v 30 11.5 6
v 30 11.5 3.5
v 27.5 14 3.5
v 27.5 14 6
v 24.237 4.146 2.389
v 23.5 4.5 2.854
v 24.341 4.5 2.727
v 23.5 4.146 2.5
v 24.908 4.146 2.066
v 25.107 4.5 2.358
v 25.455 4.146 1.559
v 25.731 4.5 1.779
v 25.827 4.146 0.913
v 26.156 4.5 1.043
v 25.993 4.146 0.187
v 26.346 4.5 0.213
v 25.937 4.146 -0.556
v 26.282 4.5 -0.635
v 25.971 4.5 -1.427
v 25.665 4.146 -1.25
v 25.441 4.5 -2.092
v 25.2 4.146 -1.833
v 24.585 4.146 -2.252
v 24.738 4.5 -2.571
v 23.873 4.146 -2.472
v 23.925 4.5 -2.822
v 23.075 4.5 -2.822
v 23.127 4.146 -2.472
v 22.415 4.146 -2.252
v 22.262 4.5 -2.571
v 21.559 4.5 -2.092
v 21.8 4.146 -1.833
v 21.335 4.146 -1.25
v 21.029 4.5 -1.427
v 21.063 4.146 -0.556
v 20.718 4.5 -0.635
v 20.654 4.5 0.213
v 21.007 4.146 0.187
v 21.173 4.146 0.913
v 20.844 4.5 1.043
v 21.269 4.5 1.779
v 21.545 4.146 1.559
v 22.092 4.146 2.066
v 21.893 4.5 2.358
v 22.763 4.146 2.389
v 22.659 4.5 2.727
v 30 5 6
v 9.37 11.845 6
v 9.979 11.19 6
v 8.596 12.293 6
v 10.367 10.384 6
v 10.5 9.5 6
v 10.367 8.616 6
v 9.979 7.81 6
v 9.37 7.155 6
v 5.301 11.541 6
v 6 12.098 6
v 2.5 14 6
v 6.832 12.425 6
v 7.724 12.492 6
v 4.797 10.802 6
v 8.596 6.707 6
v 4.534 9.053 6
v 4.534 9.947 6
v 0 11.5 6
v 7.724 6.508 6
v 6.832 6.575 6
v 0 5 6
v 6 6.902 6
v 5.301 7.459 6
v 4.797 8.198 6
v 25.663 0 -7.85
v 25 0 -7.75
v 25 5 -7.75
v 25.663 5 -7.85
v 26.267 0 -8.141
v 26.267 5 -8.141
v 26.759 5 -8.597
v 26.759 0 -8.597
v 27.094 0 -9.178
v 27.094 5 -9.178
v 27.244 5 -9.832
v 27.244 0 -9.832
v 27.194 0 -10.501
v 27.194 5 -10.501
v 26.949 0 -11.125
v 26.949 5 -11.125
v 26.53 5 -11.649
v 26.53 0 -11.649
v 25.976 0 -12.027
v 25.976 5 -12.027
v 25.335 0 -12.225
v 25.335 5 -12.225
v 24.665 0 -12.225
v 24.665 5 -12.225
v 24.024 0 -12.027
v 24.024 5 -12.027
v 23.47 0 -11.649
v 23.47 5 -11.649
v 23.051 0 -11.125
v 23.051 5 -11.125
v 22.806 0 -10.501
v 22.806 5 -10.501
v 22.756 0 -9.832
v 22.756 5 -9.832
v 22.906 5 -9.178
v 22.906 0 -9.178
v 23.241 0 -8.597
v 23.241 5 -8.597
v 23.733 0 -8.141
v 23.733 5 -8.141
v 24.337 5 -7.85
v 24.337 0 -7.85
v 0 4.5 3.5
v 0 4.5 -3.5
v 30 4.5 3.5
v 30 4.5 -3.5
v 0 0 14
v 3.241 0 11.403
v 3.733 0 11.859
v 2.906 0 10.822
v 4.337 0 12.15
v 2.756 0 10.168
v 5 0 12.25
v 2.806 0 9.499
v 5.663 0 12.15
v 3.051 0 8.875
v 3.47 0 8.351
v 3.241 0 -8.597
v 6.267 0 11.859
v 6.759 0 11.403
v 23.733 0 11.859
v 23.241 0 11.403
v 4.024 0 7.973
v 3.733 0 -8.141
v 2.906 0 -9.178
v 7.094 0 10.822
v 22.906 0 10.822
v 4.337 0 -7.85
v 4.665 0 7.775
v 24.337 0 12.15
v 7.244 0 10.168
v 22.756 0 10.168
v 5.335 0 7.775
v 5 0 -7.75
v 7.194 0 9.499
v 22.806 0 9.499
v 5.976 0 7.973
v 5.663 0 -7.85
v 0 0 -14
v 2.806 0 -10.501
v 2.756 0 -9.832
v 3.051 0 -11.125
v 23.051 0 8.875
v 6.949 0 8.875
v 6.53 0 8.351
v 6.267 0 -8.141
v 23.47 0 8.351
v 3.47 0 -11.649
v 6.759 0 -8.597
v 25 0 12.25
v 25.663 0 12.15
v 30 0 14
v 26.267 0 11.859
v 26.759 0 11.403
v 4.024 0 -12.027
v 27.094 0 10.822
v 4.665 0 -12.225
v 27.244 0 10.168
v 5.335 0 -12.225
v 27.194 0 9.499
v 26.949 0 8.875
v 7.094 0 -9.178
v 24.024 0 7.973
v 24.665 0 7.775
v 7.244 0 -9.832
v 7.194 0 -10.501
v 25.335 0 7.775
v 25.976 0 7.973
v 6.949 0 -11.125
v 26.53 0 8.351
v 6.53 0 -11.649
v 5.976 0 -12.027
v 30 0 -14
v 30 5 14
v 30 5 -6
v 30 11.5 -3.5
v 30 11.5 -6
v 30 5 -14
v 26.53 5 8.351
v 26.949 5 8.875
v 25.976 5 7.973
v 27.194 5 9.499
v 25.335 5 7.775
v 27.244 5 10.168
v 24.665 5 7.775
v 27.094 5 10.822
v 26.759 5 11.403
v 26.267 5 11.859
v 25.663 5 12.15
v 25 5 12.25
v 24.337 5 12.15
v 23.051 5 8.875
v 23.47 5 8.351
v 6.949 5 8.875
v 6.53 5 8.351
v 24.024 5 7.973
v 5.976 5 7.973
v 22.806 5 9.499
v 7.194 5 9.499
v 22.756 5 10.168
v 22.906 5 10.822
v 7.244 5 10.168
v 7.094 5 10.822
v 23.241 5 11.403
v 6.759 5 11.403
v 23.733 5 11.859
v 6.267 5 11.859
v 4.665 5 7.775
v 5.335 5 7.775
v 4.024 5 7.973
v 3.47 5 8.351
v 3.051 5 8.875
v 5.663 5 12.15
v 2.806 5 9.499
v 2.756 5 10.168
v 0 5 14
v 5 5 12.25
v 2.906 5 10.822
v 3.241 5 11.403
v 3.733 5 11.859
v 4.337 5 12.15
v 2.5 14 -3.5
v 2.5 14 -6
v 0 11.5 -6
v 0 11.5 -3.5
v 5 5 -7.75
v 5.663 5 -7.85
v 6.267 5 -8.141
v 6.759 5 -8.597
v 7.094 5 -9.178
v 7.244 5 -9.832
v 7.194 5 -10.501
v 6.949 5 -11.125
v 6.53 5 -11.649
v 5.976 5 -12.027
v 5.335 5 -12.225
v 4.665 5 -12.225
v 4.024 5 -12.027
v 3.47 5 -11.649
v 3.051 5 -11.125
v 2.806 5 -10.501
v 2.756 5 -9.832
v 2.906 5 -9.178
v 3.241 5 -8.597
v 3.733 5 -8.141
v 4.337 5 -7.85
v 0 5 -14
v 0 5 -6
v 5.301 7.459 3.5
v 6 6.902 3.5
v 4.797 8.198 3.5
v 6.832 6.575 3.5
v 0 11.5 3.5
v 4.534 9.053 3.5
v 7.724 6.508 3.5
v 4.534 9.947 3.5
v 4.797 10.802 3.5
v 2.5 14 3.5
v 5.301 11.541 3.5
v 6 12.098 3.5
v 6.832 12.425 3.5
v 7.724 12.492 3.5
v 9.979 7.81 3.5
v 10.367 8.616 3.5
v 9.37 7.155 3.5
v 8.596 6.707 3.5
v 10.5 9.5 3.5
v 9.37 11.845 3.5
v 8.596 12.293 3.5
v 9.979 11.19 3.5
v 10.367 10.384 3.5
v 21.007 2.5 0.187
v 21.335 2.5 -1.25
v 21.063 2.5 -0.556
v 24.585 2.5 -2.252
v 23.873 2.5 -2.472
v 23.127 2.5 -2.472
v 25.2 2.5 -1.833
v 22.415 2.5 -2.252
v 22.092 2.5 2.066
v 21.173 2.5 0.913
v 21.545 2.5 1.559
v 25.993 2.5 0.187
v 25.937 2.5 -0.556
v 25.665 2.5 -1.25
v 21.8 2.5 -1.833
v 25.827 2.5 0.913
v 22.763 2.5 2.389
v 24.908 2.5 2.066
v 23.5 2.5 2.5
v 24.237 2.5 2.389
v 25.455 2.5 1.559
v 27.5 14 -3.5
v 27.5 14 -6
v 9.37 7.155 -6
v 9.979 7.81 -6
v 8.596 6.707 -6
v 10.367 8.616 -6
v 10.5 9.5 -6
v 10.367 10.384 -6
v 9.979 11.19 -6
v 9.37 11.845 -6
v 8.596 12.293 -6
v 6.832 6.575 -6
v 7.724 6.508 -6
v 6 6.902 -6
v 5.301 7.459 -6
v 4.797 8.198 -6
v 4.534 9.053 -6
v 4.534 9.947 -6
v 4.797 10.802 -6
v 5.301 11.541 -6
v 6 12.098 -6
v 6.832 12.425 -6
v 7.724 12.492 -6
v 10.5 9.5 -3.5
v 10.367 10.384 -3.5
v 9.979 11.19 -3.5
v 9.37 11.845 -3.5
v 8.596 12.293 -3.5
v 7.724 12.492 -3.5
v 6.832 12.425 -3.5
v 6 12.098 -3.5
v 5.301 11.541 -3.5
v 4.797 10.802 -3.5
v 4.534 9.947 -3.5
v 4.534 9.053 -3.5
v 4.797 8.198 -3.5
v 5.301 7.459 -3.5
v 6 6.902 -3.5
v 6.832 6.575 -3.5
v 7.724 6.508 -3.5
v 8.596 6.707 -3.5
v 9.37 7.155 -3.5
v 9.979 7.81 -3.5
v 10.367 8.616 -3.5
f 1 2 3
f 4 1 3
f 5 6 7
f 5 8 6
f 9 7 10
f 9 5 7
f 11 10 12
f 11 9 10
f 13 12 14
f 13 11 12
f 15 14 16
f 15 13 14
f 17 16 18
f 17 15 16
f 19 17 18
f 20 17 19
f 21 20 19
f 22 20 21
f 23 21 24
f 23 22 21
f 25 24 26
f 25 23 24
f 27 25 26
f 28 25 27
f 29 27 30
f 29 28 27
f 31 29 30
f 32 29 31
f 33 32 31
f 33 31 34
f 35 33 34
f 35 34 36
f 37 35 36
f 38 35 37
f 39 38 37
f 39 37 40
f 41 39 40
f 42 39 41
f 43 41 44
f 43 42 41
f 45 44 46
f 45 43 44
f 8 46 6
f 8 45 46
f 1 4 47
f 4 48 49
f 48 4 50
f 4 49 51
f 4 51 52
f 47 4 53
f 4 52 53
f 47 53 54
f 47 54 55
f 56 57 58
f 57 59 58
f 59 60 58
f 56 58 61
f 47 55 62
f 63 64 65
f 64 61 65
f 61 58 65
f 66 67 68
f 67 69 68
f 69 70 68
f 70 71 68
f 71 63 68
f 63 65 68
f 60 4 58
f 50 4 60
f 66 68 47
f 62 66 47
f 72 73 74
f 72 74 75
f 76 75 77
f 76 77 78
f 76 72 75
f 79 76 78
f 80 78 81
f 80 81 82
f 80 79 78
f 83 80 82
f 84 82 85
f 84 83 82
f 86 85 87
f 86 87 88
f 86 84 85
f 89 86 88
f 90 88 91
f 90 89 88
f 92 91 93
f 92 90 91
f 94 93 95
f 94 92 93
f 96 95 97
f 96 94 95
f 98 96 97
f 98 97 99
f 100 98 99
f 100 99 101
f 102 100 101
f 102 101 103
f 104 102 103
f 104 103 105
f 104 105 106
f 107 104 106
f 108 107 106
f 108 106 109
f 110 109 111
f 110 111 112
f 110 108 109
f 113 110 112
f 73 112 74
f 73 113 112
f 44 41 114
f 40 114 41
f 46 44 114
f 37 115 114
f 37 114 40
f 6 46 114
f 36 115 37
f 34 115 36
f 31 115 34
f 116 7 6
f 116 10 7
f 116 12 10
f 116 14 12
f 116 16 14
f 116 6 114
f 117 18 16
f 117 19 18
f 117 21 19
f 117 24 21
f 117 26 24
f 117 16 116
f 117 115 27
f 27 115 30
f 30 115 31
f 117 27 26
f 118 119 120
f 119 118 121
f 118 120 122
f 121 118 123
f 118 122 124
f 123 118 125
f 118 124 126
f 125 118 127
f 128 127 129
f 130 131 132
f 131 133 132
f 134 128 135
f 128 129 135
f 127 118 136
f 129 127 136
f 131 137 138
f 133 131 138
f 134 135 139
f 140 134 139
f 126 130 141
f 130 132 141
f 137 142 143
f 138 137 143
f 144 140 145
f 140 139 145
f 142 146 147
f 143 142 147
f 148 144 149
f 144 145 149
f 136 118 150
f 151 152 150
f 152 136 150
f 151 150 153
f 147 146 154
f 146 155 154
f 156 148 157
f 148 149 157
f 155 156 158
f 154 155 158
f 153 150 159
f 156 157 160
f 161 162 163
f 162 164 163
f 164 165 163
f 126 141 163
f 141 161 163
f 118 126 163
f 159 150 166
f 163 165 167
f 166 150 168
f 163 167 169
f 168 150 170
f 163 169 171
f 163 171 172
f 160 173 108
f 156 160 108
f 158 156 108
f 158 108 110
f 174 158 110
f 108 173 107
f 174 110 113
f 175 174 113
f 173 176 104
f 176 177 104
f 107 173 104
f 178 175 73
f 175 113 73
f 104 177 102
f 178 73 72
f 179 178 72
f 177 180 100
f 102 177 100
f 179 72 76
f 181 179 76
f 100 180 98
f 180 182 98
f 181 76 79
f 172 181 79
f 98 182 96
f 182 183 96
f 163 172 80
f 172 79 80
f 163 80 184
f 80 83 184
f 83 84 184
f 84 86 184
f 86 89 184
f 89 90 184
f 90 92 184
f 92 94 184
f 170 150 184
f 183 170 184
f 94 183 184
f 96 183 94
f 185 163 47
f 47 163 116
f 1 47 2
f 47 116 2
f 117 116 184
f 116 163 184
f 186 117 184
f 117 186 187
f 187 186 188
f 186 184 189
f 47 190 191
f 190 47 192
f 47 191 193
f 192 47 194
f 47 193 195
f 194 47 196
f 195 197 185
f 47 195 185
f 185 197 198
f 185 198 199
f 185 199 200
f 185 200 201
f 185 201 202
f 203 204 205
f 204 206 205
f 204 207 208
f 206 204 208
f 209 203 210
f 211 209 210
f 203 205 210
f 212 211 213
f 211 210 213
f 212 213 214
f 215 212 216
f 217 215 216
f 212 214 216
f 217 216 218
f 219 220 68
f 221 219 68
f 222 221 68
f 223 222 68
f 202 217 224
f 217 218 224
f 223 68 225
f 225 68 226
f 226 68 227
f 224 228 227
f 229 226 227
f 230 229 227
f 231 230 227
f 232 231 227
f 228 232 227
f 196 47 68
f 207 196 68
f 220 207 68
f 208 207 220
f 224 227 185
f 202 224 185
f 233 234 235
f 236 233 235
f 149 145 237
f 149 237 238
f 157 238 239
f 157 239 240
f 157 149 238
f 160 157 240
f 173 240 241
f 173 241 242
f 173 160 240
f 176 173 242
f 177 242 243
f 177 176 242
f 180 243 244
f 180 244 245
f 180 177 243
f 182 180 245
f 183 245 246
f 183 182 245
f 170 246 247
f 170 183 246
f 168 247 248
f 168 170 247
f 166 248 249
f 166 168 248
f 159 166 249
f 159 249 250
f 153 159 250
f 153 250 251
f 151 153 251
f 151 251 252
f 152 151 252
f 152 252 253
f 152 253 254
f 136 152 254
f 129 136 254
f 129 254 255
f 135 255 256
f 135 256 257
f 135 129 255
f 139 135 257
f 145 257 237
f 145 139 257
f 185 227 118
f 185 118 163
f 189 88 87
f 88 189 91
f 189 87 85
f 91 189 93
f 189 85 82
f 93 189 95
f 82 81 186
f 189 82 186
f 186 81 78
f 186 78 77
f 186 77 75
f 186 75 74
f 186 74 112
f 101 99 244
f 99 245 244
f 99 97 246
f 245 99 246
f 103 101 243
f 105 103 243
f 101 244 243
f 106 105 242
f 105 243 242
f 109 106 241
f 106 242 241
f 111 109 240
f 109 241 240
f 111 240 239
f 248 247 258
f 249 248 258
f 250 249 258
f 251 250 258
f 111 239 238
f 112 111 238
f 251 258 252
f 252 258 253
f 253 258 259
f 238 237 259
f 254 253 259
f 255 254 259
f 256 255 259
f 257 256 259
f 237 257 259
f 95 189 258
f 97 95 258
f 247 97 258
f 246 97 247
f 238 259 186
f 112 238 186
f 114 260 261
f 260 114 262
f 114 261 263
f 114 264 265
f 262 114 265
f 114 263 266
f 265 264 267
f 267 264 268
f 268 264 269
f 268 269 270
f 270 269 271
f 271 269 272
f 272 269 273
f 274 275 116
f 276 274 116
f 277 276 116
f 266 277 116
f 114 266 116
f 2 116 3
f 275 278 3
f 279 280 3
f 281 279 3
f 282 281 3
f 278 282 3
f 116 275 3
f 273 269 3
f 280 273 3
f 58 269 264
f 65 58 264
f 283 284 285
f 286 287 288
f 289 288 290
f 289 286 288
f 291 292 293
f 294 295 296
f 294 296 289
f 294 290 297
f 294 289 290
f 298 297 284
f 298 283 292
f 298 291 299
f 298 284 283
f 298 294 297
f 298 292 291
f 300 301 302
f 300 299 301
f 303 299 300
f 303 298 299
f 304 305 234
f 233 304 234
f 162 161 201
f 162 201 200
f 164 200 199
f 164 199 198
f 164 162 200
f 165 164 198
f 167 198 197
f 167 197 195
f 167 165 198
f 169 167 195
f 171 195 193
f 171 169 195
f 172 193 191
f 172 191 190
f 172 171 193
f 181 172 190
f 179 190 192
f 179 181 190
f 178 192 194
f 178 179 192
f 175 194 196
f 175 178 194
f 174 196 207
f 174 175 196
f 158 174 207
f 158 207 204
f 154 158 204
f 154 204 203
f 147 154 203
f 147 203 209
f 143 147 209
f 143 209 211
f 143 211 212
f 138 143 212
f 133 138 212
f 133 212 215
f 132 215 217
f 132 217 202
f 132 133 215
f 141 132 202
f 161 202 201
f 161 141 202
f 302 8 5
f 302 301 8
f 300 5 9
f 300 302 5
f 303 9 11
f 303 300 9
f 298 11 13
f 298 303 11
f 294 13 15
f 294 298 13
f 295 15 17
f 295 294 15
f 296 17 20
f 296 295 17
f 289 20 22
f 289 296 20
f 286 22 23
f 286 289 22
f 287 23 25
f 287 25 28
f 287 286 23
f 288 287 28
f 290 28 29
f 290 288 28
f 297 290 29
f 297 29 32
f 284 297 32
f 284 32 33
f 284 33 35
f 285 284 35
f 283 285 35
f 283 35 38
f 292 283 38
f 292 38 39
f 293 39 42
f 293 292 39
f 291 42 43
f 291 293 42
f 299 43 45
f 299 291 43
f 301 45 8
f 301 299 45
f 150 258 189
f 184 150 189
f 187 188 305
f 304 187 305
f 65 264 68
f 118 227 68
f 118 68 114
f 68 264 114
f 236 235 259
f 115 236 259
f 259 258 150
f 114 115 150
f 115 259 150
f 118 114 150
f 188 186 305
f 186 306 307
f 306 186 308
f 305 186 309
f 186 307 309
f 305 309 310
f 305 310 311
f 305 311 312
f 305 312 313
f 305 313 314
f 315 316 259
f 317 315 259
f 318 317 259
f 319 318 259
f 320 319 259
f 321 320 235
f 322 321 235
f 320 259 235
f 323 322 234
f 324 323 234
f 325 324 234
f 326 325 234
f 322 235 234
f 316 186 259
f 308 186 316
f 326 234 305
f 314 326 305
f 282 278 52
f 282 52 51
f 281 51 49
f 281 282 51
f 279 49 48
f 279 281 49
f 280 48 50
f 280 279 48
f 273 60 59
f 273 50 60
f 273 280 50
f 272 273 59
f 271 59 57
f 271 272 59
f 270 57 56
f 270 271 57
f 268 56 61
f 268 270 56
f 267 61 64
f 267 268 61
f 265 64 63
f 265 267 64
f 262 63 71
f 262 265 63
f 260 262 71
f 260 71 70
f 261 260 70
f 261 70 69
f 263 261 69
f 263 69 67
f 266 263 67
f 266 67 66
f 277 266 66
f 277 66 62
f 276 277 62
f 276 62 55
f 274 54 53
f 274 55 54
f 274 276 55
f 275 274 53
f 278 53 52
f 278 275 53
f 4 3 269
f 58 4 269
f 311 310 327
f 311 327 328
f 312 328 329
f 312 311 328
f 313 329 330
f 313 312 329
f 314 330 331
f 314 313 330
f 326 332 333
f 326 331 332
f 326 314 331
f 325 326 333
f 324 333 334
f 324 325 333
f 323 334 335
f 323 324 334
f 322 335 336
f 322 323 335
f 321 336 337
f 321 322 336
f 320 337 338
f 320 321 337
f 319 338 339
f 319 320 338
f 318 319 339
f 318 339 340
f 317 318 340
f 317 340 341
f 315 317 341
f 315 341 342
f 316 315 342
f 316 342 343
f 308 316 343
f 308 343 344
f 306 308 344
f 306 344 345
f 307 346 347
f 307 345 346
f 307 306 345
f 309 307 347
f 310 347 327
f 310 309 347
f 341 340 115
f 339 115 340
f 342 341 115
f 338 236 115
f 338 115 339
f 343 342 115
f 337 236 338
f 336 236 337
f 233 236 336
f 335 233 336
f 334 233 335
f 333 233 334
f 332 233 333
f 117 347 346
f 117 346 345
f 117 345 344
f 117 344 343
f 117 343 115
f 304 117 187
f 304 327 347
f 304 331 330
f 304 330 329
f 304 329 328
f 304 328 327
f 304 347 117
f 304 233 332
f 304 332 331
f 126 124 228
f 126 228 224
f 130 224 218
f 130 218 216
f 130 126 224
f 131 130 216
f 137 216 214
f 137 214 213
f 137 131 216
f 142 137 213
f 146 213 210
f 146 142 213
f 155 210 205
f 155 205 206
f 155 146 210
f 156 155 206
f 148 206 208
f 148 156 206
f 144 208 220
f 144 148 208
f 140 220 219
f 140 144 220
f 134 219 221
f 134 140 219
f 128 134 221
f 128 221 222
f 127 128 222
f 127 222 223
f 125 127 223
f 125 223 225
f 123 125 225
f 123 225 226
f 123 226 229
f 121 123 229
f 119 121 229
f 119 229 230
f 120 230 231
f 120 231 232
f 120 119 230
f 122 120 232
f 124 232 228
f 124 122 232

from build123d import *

# Parameters (mm, degrees)
BOSS_EXTRUDE1_DEPTH      = 14
BOSS_EXTRUDE1_DEPTH_BACK = 14
CUT_EXTRUDE1_DEPTH       = 14
CUT_EXTRUDE1_DEPTH_BACK  = 14
SKETCH2_R                = 3
CUT_EXTRUDE2_DEPTH       = 3.5
CUT_EXTRUDE2_DEPTH_BACK  = 3.5
SKETCH3_W                = 30
SKETCH3_H                = 9.5
SKETCH5_W                = 56
SKETCH5_H                = 28
CUT_EXTRUDE3_DEPTH       = 30
SKETCH6_R                = 2.25
CUT_EXTRUDE4_DEPTH       = 5
SKETCH7_R                = 2.25
CUT_EXTRUDE5_DEPTH       = 5
SKETCH8_R                = 2.25
CUT_EXTRUDE6_DEPTH       = 5
SKETCH9_R                = 2.25
CUT_EXTRUDE7_DEPTH       = 5


with BuildPart() as part:
    # Sketch1 → Boss-Extrude1 (new, two sides: drawn at the far end of the back side and taken through both)
    with BuildSketch(Plane.XY.offset(-BOSS_EXTRUDE1_DEPTH_BACK)):
        Polygon((0, 11.5), (0, 0), (30, 0), (30, 11.5), (27.5, 14), (2.5, 14), align=None)
    extrude(amount=BOSS_EXTRUDE1_DEPTH + BOSS_EXTRUDE1_DEPTH_BACK)

    # Sketch2 → Cut-Extrude1 (cut, two sides: drawn at the far end of the back side and taken through both)
    with BuildSketch(Plane.XY.offset(-CUT_EXTRUDE1_DEPTH_BACK)):
        with Locations((7.5, 9.5)):
            Circle(SKETCH2_R)
    extrude(amount=CUT_EXTRUDE1_DEPTH + CUT_EXTRUDE1_DEPTH_BACK, mode=Mode.SUBTRACT)

    # Sketch3 → Cut-Extrude2 (cut, two sides: drawn at the far end of the back side and taken through both)
    with BuildSketch(Plane.XY.offset(-CUT_EXTRUDE2_DEPTH_BACK)):
        with Locations((15, 9.25)):
            Rectangle(SKETCH3_W, SKETCH3_H)
    extrude(amount=CUT_EXTRUDE2_DEPTH + CUT_EXTRUDE2_DEPTH_BACK, mode=Mode.SUBTRACT)

    # Sketch4 → Cut-Revolve1 (revolve, cut)
    with BuildSketch(Plane.XY):
        Polygon((23.5, 4.5), (26.353553391, 4.5), (26, 4.146446609), (26, 2.5), (23.5, 2.5), align=None)
    revolve(axis=Axis((23.5, 2.5, 0), (0, 1, 0)), mode=Mode.SUBTRACT)

    # Sketch5 → Cut-Extrude3 (cut)
    with BuildSketch(Plane(origin=(0, 0, 0), x_dir=(0, 0, -1), z_dir=(1, 0, 0))):
        with Locations((0, 12)):
            Rectangle(SKETCH5_W, SKETCH5_H)
        Polygon((-14, 5), (-14, 0), (14, 0), (14, 5), (6, 5), (6, 14), (-6, 14), (-6, 5), align=None, mode=Mode.SUBTRACT)
    extrude(amount=CUT_EXTRUDE3_DEPTH, mode=Mode.SUBTRACT)

    # Sketch6 → Cut-Extrude4 (cut)
    with BuildSketch(Plane(origin=(0, 0, 0), x_dir=(1, 0, 0), z_dir=(0, 1, 0))):
        with Locations((5, -10)):
            Circle(SKETCH6_R)
    extrude(amount=CUT_EXTRUDE4_DEPTH, mode=Mode.SUBTRACT)

    # Sketch7 → Cut-Extrude5 (cut)
    with BuildSketch(Plane(origin=(0, 0, 0), x_dir=(1, 0, 0), z_dir=(0, 1, 0))):
        with Locations((25, 10)):
            Circle(SKETCH7_R)
    extrude(amount=CUT_EXTRUDE5_DEPTH, mode=Mode.SUBTRACT)

    # Sketch8 → Cut-Extrude6 (cut)
    with BuildSketch(Plane(origin=(0, 0, 0), x_dir=(1, 0, 0), z_dir=(0, 1, 0))):
        with Locations((25, -10)):
            Circle(SKETCH8_R)
    extrude(amount=CUT_EXTRUDE6_DEPTH, mode=Mode.SUBTRACT)

    # Sketch9 → Cut-Extrude7 (cut)
    with BuildSketch(Plane(origin=(0, 0, 0), x_dir=(1, 0, 0), z_dir=(0, 1, 0))):
        with Locations((5, 10)):
            Circle(SKETCH9_R)
    extrude(amount=CUT_EXTRUDE7_DEPTH, mode=Mode.SUBTRACT)


solid = part.part
